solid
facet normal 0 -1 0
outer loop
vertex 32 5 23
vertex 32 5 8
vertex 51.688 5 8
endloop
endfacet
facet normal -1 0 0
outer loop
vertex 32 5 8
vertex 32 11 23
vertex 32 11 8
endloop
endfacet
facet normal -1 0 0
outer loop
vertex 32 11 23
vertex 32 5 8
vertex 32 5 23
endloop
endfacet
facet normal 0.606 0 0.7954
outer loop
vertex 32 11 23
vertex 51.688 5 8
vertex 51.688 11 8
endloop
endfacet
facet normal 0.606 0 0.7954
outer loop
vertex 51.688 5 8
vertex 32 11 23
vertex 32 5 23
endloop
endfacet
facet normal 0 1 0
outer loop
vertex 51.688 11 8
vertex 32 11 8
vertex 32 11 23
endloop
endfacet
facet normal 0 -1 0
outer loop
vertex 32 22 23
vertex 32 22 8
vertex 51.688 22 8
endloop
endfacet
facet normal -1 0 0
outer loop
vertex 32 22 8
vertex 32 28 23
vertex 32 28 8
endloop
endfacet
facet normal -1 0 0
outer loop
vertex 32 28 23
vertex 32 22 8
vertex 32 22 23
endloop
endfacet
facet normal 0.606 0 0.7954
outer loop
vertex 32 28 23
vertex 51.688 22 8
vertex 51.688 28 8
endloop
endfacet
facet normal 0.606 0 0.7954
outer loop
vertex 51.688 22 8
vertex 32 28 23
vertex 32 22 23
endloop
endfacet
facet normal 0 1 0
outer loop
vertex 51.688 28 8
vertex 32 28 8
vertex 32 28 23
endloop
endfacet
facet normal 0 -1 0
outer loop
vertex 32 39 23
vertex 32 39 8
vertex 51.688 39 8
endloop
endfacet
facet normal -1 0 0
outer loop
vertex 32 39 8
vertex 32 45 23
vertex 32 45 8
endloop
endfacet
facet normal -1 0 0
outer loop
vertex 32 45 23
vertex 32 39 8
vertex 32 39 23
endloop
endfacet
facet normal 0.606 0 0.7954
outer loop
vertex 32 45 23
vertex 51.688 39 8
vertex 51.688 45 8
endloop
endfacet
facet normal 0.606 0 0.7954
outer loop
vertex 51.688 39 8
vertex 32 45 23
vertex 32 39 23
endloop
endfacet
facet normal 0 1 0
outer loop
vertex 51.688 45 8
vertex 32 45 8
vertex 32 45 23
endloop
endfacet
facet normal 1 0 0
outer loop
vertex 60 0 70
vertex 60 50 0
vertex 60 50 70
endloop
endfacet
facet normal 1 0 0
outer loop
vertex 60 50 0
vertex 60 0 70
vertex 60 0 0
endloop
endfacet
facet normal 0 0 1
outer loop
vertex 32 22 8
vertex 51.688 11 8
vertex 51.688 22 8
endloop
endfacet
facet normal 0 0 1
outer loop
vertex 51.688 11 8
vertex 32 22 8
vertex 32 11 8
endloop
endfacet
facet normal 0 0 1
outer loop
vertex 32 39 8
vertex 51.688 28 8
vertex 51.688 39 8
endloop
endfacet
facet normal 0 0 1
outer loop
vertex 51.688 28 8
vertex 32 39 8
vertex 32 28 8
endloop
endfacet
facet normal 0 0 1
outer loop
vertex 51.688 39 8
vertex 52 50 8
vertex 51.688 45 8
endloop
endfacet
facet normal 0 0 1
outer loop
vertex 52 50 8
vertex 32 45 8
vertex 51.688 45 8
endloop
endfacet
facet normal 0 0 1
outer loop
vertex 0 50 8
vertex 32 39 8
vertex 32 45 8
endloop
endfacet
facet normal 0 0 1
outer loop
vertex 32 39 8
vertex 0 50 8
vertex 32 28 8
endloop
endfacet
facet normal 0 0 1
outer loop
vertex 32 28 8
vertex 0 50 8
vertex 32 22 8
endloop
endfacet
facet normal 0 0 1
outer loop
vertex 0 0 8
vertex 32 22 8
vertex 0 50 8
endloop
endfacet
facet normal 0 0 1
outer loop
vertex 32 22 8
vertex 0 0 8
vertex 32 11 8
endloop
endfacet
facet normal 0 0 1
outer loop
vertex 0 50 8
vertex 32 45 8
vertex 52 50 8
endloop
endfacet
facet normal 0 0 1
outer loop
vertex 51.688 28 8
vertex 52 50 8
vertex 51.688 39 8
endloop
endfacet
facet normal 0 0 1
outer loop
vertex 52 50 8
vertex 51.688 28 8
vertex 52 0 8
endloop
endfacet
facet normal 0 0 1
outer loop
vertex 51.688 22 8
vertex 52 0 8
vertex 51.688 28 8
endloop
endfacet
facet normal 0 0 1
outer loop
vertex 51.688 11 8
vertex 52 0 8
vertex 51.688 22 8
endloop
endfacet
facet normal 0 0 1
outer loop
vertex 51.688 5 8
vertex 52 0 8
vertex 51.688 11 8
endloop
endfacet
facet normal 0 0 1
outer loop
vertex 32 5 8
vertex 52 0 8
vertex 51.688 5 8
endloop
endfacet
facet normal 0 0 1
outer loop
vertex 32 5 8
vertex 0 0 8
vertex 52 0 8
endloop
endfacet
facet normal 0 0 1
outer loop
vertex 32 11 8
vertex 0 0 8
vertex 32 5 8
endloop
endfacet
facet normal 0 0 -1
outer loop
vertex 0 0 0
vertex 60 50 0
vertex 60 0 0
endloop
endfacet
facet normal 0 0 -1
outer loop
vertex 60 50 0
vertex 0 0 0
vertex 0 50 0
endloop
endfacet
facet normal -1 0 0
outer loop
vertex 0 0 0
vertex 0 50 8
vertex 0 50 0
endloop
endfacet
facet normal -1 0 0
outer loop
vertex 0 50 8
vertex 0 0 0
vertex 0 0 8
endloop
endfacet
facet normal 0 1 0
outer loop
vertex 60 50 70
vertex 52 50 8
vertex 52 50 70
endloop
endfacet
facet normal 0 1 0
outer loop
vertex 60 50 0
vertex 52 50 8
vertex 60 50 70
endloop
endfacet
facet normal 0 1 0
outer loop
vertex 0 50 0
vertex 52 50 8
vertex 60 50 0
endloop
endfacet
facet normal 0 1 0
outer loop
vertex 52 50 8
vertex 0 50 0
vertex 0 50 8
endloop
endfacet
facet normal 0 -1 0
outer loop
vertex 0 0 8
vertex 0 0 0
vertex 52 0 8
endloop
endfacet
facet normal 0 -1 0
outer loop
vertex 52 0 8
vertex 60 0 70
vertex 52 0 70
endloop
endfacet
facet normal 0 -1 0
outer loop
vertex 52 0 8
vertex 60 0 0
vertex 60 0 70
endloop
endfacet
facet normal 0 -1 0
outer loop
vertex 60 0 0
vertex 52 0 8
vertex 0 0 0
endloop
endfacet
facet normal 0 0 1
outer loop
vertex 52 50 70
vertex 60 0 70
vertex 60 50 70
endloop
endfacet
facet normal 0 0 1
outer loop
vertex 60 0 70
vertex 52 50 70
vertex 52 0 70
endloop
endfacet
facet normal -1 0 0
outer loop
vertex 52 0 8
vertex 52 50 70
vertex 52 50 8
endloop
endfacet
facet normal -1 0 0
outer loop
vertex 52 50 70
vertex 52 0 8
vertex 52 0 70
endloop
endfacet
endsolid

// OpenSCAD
$fn = 32;

// ----------------------------------------------------------------------
// Rib bracket: 3-gusset L bracket
// ----------------------------------------------------------------------

// --- parameters (mm) ---
base_l = 60;              // foot length, X
base_w = 50;              // foot width, Y
base_t = 8;               // foot thickness
plate_t = 8;              // upright plate thickness
plate_h = 70;             // overall height
gus_l = 20;               // gusset leg along the foot
gus_h = 16;               // gusset height
gus_t = 6;                // gusset thickness
gus_edge = 5;             // gusset margin from the foot edge
n_gus = 3;                // gusset count

gus_pitch = (base_w - 2 * gus_edge - gus_t) / (n_gus - 1);  // gusset pitch

union() {
  cube([base_l, base_w, base_t]);
  translate([base_l - plate_t, 0, base_t - 1])
    cube([plate_t, base_w, plate_h - base_t + 1]);
  for (i = [0 : n_gus - 1])
    translate([base_l - plate_t - gus_l, gus_edge + i * gus_pitch, base_t - 1])
      rotate([-90, 0, 0])
        linear_extrude(height = gus_t)
          polygon(points = [[0, 0], [gus_l + 1, 0], [0, -gus_h]]);
}
